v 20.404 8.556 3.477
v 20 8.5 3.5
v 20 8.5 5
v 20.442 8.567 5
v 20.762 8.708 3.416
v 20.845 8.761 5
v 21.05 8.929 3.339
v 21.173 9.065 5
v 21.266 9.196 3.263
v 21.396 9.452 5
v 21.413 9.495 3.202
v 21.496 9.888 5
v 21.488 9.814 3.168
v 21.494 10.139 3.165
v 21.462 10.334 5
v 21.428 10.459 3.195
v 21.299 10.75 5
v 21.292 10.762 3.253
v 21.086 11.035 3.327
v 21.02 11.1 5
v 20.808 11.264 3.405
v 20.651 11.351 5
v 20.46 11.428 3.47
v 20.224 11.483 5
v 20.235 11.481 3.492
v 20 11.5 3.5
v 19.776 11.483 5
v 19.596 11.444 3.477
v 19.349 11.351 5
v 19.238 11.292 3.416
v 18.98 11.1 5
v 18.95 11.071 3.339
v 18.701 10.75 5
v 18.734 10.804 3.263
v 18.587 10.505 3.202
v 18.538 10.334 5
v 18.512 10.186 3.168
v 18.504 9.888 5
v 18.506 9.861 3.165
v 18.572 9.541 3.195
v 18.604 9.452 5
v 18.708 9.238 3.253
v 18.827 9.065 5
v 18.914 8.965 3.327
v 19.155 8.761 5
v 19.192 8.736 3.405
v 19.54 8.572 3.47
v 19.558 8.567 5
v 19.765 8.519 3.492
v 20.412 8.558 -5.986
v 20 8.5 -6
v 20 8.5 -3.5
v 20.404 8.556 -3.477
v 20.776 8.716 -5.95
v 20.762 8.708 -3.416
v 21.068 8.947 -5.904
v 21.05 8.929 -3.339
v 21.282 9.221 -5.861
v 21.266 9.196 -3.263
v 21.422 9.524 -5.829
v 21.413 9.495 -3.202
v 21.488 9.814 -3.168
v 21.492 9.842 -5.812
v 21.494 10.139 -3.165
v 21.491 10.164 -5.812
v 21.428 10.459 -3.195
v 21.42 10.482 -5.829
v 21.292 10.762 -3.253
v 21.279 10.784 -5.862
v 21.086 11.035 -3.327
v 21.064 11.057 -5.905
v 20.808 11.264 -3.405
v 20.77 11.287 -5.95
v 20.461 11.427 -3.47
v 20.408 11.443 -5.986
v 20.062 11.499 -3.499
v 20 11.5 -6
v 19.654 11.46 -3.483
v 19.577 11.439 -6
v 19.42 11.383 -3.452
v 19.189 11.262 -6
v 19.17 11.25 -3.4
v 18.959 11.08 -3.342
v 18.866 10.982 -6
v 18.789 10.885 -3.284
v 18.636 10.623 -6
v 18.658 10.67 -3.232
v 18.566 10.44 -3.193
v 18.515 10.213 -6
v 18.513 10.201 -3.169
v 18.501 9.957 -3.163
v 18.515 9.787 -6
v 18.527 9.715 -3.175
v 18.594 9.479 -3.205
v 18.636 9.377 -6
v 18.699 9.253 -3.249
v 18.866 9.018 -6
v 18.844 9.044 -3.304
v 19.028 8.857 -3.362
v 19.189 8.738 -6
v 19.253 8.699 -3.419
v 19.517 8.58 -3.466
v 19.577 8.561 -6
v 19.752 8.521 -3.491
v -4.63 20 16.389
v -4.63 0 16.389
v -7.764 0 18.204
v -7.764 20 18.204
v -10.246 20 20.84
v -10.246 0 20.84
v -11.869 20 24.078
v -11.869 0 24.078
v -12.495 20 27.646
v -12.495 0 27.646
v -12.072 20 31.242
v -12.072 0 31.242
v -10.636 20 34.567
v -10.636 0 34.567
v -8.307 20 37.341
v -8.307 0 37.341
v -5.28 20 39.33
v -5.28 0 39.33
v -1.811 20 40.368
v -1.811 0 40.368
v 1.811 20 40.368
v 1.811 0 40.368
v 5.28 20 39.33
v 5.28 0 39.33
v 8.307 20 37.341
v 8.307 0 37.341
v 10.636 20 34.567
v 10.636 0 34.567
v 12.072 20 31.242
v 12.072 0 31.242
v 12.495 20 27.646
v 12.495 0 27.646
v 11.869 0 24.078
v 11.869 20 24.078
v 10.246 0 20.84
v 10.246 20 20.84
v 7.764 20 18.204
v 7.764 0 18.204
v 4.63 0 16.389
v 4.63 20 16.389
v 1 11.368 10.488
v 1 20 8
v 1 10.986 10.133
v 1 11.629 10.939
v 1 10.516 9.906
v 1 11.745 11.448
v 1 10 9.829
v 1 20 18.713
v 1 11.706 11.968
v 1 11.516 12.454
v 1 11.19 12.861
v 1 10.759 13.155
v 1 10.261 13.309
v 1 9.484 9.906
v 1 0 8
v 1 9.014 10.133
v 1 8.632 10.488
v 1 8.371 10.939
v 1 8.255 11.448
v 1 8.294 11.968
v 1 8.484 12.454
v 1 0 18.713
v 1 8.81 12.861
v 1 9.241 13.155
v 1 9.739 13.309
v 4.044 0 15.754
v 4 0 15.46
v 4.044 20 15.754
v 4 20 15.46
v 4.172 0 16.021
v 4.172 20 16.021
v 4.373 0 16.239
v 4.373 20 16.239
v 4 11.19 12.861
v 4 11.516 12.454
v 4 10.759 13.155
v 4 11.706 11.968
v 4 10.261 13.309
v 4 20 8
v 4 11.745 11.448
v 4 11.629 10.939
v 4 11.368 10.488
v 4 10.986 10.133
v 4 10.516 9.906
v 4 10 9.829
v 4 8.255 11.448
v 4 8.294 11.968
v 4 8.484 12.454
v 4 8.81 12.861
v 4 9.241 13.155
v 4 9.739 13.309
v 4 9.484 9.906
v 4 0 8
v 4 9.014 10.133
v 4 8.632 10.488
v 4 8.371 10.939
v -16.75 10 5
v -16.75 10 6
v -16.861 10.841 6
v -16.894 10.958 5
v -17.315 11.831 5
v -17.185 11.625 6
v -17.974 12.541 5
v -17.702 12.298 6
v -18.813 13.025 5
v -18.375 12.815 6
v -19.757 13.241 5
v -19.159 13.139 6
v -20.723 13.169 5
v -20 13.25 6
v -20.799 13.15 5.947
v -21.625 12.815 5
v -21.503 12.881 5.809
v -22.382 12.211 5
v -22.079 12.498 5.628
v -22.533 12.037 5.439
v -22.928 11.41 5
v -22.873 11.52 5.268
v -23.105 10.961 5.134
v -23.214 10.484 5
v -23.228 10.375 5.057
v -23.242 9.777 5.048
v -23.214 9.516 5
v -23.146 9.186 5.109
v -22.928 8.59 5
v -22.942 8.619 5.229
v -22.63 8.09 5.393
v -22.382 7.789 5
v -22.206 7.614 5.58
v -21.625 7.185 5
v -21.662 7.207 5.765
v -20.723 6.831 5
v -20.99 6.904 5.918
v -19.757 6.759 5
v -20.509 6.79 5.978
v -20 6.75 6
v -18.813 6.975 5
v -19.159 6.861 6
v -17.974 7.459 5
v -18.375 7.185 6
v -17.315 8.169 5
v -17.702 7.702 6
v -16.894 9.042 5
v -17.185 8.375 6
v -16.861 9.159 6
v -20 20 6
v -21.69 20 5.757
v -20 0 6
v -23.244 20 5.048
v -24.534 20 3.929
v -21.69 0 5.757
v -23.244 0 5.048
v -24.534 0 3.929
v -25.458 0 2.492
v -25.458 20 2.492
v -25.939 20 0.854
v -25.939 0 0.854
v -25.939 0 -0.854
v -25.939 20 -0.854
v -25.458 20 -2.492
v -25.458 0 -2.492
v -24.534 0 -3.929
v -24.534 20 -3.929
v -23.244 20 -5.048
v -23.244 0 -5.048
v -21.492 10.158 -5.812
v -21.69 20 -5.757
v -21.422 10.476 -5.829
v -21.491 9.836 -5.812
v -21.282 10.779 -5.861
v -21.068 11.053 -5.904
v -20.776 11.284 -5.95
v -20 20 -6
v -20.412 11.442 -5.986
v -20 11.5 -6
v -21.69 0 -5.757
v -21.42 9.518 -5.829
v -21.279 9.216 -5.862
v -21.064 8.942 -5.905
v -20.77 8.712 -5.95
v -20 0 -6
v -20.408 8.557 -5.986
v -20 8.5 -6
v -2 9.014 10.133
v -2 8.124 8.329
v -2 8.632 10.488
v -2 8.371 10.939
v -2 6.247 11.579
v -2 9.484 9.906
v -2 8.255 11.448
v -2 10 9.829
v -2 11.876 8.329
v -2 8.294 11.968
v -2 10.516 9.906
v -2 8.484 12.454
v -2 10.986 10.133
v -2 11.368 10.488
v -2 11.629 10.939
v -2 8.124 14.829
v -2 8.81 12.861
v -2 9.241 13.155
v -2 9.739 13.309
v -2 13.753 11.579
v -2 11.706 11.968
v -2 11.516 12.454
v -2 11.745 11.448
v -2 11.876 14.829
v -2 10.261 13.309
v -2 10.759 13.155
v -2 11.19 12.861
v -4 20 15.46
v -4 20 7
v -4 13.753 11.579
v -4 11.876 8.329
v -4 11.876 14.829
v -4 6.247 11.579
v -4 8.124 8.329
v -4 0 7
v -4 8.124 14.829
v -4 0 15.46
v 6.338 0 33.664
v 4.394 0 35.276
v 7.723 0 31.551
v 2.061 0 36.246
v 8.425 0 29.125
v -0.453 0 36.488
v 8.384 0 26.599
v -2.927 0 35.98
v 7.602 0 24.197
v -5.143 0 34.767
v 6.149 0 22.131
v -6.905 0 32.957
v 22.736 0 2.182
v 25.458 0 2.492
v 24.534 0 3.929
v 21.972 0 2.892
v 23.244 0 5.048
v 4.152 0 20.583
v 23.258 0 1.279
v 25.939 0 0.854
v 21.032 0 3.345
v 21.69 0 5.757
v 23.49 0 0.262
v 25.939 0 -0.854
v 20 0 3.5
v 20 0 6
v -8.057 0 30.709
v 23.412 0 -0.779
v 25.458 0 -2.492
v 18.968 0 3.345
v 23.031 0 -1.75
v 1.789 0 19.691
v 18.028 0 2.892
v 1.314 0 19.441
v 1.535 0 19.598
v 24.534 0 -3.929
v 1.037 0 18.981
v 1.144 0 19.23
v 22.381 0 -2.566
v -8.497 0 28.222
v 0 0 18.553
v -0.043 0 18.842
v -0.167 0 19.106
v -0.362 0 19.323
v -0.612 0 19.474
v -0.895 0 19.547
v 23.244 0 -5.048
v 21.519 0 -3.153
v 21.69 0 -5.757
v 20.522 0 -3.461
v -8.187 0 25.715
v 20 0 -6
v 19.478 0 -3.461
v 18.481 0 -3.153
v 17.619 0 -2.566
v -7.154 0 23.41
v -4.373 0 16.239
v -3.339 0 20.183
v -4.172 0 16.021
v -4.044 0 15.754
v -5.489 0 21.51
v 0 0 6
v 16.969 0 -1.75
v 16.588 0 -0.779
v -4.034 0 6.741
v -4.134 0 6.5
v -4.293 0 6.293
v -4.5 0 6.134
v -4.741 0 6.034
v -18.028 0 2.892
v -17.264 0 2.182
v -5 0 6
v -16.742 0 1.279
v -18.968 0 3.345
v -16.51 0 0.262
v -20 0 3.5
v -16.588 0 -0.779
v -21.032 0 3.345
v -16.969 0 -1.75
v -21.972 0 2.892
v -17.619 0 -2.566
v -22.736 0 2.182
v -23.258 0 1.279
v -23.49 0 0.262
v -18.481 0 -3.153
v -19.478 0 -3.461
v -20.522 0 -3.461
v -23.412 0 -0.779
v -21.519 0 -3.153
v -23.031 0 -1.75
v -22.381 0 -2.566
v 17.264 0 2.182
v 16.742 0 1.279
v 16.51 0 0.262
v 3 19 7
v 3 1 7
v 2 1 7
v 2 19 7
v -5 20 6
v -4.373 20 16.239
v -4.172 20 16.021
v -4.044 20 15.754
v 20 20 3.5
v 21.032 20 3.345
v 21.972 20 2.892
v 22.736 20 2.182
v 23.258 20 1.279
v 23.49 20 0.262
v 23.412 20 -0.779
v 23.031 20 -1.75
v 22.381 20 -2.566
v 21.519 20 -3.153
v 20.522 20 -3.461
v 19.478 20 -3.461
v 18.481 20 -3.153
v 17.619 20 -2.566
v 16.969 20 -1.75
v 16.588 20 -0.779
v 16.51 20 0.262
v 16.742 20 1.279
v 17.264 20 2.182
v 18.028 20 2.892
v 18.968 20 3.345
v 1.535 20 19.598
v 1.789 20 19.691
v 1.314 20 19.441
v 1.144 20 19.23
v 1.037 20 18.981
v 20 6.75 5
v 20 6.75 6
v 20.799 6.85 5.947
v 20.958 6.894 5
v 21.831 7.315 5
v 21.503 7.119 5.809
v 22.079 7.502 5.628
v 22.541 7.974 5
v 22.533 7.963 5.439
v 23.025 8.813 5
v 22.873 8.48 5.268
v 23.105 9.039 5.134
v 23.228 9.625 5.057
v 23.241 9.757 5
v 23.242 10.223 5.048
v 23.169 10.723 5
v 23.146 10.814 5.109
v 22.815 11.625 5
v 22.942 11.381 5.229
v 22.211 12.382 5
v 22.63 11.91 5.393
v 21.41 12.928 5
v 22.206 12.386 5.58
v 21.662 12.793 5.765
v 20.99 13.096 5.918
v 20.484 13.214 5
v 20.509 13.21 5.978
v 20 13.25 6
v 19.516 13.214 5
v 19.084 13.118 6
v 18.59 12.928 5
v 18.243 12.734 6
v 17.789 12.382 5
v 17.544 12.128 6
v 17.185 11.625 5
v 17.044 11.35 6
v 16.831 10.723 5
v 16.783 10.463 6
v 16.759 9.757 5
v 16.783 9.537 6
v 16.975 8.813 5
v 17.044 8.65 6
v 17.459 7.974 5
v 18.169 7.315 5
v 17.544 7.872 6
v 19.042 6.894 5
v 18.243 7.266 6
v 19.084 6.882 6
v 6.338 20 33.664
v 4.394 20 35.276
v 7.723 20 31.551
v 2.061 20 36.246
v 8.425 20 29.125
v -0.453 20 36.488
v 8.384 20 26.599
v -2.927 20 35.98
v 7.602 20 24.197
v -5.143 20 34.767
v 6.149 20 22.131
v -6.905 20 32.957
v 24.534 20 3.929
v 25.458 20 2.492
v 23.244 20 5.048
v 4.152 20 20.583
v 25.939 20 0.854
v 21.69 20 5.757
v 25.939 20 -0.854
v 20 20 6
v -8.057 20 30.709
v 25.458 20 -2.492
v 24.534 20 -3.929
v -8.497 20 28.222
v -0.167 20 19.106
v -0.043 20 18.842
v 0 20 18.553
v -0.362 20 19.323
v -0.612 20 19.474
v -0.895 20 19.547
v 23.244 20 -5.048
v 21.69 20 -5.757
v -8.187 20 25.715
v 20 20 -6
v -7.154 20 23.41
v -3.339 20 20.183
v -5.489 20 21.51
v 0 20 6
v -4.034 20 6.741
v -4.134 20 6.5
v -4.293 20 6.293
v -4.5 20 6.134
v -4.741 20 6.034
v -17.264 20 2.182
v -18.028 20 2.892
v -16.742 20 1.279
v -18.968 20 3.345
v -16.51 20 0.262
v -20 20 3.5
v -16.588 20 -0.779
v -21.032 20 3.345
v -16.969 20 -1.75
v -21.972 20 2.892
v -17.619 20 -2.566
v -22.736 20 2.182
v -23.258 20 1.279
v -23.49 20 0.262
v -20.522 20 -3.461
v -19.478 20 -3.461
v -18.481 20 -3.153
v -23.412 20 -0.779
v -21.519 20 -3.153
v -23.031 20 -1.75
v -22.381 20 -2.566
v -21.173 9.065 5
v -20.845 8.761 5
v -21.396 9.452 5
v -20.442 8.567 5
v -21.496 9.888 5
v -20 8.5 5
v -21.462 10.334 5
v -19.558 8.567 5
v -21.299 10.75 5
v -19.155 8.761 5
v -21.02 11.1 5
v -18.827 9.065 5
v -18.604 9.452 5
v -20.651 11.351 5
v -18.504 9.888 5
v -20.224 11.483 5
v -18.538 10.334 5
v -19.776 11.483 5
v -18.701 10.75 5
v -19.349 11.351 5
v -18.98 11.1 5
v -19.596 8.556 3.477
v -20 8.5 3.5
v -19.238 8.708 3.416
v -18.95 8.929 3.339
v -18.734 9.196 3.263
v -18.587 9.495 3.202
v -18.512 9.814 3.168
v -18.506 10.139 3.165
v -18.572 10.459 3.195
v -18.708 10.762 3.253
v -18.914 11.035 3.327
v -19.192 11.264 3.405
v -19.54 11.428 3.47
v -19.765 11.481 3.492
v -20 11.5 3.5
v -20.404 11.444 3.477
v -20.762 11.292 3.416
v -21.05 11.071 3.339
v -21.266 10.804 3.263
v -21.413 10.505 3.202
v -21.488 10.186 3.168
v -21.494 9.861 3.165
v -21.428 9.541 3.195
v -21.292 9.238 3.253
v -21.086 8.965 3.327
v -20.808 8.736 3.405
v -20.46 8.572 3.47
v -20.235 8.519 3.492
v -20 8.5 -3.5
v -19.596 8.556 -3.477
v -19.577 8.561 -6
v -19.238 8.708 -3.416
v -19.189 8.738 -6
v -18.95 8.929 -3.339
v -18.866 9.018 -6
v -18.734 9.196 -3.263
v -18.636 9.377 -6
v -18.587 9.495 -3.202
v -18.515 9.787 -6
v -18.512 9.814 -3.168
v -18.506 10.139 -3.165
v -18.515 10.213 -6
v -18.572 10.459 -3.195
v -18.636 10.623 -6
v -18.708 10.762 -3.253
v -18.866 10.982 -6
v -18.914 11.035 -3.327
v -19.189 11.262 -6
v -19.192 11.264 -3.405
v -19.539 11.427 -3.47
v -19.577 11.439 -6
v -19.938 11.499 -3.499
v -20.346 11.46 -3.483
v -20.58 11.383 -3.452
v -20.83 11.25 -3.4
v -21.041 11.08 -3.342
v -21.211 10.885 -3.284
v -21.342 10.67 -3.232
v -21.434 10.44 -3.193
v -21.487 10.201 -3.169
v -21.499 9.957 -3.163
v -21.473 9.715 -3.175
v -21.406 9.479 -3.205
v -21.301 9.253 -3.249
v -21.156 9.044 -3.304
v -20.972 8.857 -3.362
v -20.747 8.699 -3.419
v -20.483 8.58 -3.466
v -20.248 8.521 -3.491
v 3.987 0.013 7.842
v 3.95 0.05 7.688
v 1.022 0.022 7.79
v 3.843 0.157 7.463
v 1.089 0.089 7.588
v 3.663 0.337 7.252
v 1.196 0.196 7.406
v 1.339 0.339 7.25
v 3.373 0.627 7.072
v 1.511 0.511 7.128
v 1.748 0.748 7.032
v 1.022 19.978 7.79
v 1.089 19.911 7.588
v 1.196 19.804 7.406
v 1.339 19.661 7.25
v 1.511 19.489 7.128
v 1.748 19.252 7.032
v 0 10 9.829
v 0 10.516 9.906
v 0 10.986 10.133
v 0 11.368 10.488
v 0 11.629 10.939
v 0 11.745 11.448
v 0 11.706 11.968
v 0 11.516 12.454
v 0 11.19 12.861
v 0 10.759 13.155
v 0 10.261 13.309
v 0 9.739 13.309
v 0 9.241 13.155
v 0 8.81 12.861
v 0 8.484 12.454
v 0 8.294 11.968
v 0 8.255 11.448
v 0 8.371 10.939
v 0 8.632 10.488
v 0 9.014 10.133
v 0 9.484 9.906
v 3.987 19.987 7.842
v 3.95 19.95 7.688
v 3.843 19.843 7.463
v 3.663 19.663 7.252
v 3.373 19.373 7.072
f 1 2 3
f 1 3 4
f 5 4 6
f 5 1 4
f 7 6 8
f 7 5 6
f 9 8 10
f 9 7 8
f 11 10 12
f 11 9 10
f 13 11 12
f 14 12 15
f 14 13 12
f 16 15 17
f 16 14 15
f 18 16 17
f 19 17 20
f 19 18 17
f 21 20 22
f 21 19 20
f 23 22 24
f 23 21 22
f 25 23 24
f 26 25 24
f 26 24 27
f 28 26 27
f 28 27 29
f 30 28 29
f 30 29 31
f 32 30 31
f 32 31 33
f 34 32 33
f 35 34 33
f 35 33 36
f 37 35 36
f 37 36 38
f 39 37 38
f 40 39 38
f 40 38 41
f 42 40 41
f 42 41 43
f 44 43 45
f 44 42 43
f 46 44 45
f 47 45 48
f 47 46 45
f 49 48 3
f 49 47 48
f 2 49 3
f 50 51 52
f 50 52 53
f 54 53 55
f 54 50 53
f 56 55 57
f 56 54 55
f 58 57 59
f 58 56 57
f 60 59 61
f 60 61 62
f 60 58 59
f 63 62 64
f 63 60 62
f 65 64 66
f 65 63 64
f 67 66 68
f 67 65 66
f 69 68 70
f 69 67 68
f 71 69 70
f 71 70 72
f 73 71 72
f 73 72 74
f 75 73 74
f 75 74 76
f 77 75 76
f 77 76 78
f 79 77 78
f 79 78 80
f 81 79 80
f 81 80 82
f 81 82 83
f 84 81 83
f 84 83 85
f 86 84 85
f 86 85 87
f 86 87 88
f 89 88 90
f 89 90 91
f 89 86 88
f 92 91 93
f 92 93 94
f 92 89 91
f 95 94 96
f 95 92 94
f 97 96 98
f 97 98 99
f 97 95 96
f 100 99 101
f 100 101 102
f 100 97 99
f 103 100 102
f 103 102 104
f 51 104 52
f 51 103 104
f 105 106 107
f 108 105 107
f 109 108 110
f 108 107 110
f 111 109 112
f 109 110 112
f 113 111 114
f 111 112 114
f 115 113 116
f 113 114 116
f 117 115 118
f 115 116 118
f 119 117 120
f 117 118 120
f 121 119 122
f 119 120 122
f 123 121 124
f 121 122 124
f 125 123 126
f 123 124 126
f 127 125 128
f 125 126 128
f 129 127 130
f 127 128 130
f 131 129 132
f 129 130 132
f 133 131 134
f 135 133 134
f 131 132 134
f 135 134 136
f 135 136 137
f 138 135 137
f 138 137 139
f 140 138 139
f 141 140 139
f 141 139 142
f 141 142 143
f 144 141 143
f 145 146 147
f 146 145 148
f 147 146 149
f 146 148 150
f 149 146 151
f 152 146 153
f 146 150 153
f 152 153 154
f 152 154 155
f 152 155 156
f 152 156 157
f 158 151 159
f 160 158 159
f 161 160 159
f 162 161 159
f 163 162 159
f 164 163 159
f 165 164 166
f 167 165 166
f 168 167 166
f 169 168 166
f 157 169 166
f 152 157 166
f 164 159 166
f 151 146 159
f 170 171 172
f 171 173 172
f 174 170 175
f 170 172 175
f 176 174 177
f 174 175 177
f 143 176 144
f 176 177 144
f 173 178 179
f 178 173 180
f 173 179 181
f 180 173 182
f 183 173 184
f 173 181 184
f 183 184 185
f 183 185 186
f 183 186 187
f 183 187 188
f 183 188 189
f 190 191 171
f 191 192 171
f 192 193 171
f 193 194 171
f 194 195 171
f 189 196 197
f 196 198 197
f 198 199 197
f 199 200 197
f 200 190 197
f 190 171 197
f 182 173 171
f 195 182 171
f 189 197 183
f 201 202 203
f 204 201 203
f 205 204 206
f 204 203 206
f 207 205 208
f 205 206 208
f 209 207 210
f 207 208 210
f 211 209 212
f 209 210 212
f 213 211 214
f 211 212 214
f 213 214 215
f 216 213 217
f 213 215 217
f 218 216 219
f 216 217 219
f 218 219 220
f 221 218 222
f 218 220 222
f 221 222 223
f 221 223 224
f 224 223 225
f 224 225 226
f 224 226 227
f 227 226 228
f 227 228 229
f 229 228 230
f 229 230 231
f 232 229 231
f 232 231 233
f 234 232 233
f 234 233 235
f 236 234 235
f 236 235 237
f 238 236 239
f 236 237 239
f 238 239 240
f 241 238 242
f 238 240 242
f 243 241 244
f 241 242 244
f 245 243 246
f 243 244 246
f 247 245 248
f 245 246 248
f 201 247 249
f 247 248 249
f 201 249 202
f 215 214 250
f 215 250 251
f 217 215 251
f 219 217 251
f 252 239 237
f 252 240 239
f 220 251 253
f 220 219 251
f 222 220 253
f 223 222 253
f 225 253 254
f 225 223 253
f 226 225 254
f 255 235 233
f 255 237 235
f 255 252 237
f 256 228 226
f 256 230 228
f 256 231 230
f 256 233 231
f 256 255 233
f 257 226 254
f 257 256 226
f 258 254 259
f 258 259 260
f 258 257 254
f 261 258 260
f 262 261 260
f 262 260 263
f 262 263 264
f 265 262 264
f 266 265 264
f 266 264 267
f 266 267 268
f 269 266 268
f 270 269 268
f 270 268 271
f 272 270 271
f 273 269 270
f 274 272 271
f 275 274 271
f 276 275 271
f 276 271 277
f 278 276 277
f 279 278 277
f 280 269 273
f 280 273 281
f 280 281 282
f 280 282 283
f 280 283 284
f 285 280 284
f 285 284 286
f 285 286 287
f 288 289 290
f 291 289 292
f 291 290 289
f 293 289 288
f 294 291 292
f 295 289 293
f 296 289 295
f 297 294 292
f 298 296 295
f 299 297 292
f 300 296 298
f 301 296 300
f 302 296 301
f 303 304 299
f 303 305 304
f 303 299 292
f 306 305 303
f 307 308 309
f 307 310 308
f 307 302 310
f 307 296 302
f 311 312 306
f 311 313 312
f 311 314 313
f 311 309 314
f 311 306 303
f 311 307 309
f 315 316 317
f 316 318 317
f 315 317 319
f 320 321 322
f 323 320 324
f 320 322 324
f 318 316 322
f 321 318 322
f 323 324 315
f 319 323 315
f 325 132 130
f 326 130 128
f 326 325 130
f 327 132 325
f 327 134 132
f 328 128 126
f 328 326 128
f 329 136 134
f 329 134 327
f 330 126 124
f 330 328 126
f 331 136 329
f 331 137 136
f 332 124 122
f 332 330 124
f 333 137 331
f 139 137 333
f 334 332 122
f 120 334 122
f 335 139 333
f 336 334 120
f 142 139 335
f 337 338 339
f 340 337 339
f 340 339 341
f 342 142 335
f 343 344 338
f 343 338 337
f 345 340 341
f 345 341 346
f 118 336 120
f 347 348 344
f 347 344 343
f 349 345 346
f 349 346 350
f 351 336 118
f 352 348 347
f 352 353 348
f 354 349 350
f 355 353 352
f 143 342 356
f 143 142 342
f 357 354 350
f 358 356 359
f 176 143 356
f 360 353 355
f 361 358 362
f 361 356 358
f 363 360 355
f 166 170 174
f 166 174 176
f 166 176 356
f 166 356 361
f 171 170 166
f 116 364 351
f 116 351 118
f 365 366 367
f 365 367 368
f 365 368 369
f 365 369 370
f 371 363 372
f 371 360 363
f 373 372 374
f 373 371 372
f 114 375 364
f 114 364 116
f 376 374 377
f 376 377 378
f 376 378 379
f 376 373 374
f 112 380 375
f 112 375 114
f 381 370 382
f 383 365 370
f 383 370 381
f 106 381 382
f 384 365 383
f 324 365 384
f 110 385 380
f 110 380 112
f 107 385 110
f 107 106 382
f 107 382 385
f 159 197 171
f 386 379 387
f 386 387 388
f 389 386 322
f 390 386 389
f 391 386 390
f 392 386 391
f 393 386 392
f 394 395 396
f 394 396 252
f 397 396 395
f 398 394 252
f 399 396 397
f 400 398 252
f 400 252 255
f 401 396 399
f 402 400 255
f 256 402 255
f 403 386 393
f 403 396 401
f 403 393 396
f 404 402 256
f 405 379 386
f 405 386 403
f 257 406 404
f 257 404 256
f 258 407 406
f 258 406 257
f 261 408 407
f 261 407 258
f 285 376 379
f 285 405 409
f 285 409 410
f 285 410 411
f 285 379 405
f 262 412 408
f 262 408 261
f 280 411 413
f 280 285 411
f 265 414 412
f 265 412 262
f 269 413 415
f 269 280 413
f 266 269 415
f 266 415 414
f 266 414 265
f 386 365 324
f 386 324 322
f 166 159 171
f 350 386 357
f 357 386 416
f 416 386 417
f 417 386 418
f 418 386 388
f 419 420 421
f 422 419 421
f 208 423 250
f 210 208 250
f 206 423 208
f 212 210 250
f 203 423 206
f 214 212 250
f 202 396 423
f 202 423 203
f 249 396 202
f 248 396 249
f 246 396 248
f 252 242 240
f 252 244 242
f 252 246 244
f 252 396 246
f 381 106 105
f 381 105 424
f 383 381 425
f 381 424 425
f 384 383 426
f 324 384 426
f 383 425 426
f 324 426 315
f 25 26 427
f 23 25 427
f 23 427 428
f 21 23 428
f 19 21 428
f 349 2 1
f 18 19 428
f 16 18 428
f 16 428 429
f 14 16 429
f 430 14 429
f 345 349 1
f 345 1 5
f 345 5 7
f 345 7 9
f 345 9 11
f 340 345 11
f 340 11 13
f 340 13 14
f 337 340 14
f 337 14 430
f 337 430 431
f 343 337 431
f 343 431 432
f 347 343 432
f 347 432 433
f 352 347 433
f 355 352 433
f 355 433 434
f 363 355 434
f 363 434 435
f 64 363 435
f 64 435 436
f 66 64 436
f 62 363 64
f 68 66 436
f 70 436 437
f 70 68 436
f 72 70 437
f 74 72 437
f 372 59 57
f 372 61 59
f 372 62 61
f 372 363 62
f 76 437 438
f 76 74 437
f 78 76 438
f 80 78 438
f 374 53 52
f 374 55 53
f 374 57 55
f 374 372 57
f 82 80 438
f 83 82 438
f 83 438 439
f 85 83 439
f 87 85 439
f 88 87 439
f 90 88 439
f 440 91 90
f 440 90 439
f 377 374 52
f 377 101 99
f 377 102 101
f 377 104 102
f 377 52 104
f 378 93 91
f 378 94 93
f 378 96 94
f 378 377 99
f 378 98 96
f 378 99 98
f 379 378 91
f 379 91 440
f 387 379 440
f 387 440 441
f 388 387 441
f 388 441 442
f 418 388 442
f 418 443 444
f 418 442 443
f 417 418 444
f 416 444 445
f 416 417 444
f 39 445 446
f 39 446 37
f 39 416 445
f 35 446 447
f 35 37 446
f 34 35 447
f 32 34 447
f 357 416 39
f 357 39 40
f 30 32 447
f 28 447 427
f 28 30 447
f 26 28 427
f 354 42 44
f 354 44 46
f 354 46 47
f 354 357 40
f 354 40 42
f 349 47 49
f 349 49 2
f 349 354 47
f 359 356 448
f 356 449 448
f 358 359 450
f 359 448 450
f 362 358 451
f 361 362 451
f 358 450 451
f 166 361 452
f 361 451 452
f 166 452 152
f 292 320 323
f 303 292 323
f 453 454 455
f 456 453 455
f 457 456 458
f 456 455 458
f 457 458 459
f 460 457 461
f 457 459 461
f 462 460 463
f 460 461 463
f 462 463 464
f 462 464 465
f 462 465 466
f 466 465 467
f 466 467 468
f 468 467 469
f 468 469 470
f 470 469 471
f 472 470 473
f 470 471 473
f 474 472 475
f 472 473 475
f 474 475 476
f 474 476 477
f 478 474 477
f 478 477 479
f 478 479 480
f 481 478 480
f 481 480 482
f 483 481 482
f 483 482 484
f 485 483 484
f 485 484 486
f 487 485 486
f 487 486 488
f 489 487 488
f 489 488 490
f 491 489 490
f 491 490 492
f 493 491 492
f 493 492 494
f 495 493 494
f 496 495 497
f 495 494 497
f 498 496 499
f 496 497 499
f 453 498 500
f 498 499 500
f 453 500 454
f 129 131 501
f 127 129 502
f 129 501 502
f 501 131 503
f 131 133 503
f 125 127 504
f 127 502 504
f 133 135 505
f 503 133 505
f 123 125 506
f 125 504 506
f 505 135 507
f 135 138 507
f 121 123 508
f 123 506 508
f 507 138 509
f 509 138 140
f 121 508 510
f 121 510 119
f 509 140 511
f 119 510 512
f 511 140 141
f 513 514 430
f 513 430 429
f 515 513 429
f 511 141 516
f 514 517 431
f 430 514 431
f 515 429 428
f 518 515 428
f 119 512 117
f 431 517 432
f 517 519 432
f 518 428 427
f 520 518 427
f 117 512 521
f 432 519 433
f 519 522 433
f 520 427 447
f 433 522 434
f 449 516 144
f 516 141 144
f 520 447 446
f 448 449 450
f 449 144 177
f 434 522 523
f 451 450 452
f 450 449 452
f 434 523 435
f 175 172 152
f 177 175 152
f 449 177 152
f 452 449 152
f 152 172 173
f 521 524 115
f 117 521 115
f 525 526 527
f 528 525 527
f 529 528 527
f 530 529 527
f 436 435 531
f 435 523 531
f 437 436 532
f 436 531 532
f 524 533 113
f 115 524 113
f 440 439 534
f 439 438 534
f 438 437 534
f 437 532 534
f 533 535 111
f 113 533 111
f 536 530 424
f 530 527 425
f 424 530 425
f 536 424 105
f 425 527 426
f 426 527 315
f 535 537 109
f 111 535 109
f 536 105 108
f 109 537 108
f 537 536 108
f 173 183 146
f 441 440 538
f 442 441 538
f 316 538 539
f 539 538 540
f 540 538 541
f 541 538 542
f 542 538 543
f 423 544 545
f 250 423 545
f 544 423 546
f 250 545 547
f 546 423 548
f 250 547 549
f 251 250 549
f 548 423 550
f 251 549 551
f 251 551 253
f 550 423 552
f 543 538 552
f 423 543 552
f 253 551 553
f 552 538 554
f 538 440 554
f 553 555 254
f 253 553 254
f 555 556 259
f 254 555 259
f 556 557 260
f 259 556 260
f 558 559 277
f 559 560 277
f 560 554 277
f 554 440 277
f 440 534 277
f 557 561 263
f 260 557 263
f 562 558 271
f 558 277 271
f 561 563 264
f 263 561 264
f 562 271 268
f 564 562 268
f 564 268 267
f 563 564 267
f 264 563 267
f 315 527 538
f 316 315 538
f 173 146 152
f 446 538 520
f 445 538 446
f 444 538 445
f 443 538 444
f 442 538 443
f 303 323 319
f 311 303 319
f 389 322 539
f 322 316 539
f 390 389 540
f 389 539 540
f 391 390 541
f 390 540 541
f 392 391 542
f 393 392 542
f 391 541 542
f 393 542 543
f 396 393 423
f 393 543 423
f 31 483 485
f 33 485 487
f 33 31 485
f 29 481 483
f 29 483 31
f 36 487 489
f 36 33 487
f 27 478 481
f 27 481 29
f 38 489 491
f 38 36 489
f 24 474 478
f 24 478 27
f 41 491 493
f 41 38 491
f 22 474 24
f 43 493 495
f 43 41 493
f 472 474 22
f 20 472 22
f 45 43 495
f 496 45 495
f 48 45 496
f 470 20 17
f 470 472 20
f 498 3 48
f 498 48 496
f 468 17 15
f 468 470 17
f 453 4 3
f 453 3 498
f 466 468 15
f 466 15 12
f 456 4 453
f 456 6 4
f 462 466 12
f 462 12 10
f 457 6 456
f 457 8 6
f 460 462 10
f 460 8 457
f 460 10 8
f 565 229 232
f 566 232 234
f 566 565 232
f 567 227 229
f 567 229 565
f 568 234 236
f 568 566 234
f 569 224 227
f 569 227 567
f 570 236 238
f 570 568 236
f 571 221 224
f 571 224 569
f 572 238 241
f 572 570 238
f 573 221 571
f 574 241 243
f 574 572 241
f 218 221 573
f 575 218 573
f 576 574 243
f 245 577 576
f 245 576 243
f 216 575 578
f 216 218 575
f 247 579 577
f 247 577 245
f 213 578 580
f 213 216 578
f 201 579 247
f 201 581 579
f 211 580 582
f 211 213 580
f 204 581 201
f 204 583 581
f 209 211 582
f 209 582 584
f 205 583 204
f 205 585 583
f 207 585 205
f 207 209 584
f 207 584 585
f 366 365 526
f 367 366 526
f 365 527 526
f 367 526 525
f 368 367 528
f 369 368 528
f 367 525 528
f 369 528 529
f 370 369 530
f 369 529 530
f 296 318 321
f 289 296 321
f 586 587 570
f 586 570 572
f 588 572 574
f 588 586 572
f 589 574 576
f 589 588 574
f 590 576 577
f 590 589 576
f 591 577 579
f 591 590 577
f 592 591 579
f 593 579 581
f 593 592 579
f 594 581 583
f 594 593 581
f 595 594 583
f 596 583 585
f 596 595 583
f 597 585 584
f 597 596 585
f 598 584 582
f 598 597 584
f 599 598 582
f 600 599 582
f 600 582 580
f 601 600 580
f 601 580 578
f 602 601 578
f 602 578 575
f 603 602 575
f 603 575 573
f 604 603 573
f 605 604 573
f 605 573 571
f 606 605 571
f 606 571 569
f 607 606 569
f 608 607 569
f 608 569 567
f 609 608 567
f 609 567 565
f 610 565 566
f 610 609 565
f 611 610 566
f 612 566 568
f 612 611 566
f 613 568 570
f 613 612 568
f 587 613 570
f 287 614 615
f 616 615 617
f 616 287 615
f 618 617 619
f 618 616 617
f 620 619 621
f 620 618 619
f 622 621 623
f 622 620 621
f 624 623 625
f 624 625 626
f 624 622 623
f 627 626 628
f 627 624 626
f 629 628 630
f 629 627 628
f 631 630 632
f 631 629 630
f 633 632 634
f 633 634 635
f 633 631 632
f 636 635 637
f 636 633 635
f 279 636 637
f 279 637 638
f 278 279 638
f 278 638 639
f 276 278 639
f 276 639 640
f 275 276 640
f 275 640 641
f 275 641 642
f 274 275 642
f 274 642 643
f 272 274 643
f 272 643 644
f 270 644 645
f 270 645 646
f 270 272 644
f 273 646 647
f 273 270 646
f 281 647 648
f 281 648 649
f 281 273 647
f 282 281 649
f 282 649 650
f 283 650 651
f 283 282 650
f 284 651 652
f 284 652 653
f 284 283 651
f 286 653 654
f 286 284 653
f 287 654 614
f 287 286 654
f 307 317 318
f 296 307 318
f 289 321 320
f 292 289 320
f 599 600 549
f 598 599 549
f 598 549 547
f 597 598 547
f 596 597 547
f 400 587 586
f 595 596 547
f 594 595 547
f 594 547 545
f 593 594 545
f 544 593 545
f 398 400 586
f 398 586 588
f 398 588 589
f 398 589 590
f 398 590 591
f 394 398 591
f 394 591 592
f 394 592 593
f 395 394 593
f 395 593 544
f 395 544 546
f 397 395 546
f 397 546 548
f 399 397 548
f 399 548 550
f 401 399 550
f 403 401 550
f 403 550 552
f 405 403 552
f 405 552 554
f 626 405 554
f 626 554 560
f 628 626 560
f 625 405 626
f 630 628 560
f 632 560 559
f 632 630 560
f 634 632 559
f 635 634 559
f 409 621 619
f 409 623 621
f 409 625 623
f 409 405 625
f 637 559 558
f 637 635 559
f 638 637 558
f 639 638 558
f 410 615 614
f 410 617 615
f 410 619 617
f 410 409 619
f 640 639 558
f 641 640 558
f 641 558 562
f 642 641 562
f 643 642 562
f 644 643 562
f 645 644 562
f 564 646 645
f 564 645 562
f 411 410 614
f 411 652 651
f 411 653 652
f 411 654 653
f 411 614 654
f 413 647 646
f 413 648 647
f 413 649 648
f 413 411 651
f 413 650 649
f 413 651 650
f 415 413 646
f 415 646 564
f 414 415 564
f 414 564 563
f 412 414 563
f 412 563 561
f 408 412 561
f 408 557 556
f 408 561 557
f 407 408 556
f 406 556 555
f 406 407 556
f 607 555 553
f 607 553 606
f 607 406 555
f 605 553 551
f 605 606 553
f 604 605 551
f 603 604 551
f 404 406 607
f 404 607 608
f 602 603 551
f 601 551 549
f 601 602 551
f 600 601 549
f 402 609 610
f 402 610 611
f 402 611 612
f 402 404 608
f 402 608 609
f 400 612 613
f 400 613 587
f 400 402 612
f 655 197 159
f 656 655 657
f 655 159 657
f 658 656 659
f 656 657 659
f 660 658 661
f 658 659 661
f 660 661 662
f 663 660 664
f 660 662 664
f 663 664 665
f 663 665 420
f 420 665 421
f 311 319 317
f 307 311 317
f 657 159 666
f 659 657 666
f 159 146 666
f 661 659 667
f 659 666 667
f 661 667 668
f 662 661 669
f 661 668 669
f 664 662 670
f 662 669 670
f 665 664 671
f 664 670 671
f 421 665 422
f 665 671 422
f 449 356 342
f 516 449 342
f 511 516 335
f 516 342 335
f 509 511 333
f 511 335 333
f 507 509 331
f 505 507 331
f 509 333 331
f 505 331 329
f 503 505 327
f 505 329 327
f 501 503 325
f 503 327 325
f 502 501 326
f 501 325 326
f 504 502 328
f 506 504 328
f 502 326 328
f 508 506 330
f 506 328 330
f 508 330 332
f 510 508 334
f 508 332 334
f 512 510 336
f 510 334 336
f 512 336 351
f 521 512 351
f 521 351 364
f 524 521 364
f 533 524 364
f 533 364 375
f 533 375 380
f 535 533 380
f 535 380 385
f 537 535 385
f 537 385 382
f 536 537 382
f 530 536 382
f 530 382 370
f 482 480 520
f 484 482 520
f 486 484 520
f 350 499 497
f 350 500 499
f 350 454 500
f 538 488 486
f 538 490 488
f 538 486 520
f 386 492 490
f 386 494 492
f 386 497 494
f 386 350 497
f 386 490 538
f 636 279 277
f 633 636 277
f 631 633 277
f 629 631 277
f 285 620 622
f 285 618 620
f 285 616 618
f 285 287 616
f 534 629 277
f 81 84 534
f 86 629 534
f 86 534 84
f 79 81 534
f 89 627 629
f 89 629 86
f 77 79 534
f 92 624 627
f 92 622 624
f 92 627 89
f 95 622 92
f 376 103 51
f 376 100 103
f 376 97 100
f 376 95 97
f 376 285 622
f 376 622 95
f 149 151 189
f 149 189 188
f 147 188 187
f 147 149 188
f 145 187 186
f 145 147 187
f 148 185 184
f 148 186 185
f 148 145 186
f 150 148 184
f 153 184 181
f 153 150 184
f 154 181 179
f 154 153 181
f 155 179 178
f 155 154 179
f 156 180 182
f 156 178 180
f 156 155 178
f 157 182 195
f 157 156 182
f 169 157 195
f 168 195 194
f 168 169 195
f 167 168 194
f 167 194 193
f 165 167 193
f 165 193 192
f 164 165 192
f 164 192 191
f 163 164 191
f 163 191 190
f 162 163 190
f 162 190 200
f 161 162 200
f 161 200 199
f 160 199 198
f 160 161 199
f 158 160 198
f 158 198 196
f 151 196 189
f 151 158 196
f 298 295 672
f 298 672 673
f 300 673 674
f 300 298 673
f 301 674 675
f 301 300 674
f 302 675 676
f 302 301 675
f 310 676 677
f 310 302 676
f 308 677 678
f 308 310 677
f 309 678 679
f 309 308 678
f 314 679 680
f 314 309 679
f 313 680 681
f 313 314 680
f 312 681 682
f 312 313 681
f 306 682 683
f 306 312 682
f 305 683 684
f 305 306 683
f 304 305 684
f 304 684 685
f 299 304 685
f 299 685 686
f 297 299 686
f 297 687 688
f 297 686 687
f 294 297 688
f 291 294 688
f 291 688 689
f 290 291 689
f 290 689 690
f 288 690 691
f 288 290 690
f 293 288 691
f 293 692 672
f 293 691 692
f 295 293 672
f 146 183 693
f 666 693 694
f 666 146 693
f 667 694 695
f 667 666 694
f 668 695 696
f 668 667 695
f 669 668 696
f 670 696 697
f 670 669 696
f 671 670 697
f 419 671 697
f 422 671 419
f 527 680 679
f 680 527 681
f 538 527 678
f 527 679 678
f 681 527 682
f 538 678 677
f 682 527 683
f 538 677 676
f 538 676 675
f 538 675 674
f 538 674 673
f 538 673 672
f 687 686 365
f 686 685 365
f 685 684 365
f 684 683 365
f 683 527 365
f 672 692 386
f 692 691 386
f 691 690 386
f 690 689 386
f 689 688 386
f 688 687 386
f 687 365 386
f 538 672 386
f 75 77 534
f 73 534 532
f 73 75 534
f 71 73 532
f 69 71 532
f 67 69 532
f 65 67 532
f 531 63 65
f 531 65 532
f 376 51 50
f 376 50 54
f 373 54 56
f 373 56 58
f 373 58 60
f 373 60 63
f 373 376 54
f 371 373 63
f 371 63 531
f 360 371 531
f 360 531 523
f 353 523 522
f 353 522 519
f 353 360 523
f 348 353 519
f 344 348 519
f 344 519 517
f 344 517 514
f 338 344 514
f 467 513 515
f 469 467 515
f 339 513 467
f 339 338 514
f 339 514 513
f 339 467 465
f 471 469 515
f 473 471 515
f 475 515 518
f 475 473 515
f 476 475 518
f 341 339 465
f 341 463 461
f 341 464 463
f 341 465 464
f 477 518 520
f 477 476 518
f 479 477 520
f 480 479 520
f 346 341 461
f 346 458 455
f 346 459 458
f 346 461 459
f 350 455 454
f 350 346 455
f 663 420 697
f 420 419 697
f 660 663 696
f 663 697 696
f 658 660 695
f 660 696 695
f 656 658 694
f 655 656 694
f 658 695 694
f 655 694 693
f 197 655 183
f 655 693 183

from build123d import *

# Parameters (mm, degrees)
SALIENTE_EXTRUIR1_DEPTH    = 20
CROQUIS2_R                 = 3.5
CORTAR_EXTRUIR1_DEPTH      = 34.346664001
CORTAR_EXTRUIR2_DEPTH      = 34.346664001
CORTAR_EXTRUIR2_DEPTH_BACK = 34.346664001
CROQUIS3_R                 = 1.5
CROQUIS4_R                 = 3.25
CORTAR_EXTRUIR3_DEPTH      = 1
SALIENTE_EXTRUIR2_DEPTH    = 20
CORTAR_EXTRUIR4_DEPTH      = 53.117655446
CORTAR_EXTRUIR4_DEPTH_BACK = 53.117655446
CROQUIS7_R                 = 1.75
CORTAR_EXTRUIR5_DEPTH      = 2
REDONDEO1_R                = 1


with BuildPart() as part:
    # Croquis1 → Saliente-Extruir1 (new body)
    with BuildSketch(Plane(origin=(0, 0, 0), x_dir=(1, 0, 0), z_dir=(0, 1, 0))):
        with BuildLine():
            Line((-20, 6), (20, 6))
            ThreePointArc((20, 6), (26, 0), (20, -6))
            Line((20, -6), (-20, -6))
            ThreePointArc((-20, -6), (-26, 0), (-20, 6))
        make_face()
    extrude(amount=SALIENTE_EXTRUIR1_DEPTH)

    # Croquis2 → Cortar-Extruir1 (cut, through all)
    with BuildSketch(Plane(origin=(0, 0, 0), x_dir=(1, 0, 0), z_dir=(0, 1, 0))):
        with Locations(Location((-20, 0, 0), (0, 0, 270))):
            Circle(CROQUIS2_R)
        with Locations(Location((20, 0, 0), (0, 0, 270))):
            Circle(CROQUIS2_R)
    extrude(amount=CORTAR_EXTRUIR1_DEPTH, mode=Mode.SUBTRACT)

    # Croquis3 → Cortar-Extruir2 (cut, two sides: drawn at the far end of the back side and taken through both)
    with BuildSketch(Plane.XY.offset(-CORTAR_EXTRUIR2_DEPTH_BACK)):
        with Locations(Location((-20, 10, 0), (0, 0, 270))):
            Circle(CROQUIS3_R)
        with Locations(Location((20, 10, 0), (0, 0, 270))):
            Circle(CROQUIS3_R)
    extrude(amount=CORTAR_EXTRUIR2_DEPTH + CORTAR_EXTRUIR2_DEPTH_BACK, mode=Mode.SUBTRACT)

    # Croquis4 → Cortar-Extruir3 (cut)
    with BuildSketch(Plane.XY.offset(6)):
        with Locations((-20, 10)):
            Circle(CROQUIS4_R)
        with Locations(Location((20, 10, 0), (0, 0, 270.000000001))):
            Circle(CROQUIS4_R)
    extrude(amount=-CORTAR_EXTRUIR3_DEPTH, mode=Mode.SUBTRACT)

    # Croquis6 → Saliente-Extruir2 (add)
    with BuildSketch(Plane.XZ):
        with BuildLine():
            Line((-4, 6), (-4, 16.157280718))
            ThreePointArc((-4, 16.157280718), (0, 40.5), (4, 16.157280718))
            Line((4, 16.157280718), (4, 7))
            Line((4, 7), (1, 7))
            Line((1, 7), (1, 19.559028492))
            ThreePointArc((1, 19.559028492), (-0.500870333, 36.485230045), (0, 19.5))
            Line((0, 19.5), (0, 6))
            Line((0, 6), (-4, 6))
        make_face()
    extrude(amount=-SALIENTE_EXTRUIR2_DEPTH)

    # Croquis7 → Cortar-Extruir4 (cut, two sides: drawn at the far end of the back side and taken through both)
    with BuildSketch(Plane(origin=(0, 0, 0), x_dir=(0, 0, -1), z_dir=(1, 0, 0)).offset(-CORTAR_EXTRUIR4_DEPTH_BACK)):
        with Locations((-11.578640359, 10)):
            Circle(CROQUIS7_R)
    extrude(amount=CORTAR_EXTRUIR4_DEPTH + CORTAR_EXTRUIR4_DEPTH_BACK, mode=Mode.SUBTRACT)

    # Croquis8 → Cortar-Extruir5 (cut)
    with BuildSketch(Plane.ZY.offset(4)):
        Polygon((11.578640359, 13.75277675), (8.328640359, 11.876388375), (8.328640359, 8.123611625), (11.578640359, 6.24722325), (14.828640359, 8.123611625), (14.828640359, 11.876388375), align=None)
    extrude(amount=-CORTAR_EXTRUIR5_DEPTH, mode=Mode.SUBTRACT)

    # Redondeo1
    redondeo1_edges = [part.edges().sort_by_distance(p)[0] for p in [
        (0, 10, 19.5),
        (-4, 10, 6),
        (-4, 10, 16.157280718),
        (4, 10, 16.157280718),
        (4, 10, 7),
        (1, 10, 7),
        (1, 10, 19.559028492),
        (2.5, 0, 7),
        (2.5, 20, 7),
    ]]
    fillet(redondeo1_edges, radius=REDONDEO1_R)


solid = part.part
